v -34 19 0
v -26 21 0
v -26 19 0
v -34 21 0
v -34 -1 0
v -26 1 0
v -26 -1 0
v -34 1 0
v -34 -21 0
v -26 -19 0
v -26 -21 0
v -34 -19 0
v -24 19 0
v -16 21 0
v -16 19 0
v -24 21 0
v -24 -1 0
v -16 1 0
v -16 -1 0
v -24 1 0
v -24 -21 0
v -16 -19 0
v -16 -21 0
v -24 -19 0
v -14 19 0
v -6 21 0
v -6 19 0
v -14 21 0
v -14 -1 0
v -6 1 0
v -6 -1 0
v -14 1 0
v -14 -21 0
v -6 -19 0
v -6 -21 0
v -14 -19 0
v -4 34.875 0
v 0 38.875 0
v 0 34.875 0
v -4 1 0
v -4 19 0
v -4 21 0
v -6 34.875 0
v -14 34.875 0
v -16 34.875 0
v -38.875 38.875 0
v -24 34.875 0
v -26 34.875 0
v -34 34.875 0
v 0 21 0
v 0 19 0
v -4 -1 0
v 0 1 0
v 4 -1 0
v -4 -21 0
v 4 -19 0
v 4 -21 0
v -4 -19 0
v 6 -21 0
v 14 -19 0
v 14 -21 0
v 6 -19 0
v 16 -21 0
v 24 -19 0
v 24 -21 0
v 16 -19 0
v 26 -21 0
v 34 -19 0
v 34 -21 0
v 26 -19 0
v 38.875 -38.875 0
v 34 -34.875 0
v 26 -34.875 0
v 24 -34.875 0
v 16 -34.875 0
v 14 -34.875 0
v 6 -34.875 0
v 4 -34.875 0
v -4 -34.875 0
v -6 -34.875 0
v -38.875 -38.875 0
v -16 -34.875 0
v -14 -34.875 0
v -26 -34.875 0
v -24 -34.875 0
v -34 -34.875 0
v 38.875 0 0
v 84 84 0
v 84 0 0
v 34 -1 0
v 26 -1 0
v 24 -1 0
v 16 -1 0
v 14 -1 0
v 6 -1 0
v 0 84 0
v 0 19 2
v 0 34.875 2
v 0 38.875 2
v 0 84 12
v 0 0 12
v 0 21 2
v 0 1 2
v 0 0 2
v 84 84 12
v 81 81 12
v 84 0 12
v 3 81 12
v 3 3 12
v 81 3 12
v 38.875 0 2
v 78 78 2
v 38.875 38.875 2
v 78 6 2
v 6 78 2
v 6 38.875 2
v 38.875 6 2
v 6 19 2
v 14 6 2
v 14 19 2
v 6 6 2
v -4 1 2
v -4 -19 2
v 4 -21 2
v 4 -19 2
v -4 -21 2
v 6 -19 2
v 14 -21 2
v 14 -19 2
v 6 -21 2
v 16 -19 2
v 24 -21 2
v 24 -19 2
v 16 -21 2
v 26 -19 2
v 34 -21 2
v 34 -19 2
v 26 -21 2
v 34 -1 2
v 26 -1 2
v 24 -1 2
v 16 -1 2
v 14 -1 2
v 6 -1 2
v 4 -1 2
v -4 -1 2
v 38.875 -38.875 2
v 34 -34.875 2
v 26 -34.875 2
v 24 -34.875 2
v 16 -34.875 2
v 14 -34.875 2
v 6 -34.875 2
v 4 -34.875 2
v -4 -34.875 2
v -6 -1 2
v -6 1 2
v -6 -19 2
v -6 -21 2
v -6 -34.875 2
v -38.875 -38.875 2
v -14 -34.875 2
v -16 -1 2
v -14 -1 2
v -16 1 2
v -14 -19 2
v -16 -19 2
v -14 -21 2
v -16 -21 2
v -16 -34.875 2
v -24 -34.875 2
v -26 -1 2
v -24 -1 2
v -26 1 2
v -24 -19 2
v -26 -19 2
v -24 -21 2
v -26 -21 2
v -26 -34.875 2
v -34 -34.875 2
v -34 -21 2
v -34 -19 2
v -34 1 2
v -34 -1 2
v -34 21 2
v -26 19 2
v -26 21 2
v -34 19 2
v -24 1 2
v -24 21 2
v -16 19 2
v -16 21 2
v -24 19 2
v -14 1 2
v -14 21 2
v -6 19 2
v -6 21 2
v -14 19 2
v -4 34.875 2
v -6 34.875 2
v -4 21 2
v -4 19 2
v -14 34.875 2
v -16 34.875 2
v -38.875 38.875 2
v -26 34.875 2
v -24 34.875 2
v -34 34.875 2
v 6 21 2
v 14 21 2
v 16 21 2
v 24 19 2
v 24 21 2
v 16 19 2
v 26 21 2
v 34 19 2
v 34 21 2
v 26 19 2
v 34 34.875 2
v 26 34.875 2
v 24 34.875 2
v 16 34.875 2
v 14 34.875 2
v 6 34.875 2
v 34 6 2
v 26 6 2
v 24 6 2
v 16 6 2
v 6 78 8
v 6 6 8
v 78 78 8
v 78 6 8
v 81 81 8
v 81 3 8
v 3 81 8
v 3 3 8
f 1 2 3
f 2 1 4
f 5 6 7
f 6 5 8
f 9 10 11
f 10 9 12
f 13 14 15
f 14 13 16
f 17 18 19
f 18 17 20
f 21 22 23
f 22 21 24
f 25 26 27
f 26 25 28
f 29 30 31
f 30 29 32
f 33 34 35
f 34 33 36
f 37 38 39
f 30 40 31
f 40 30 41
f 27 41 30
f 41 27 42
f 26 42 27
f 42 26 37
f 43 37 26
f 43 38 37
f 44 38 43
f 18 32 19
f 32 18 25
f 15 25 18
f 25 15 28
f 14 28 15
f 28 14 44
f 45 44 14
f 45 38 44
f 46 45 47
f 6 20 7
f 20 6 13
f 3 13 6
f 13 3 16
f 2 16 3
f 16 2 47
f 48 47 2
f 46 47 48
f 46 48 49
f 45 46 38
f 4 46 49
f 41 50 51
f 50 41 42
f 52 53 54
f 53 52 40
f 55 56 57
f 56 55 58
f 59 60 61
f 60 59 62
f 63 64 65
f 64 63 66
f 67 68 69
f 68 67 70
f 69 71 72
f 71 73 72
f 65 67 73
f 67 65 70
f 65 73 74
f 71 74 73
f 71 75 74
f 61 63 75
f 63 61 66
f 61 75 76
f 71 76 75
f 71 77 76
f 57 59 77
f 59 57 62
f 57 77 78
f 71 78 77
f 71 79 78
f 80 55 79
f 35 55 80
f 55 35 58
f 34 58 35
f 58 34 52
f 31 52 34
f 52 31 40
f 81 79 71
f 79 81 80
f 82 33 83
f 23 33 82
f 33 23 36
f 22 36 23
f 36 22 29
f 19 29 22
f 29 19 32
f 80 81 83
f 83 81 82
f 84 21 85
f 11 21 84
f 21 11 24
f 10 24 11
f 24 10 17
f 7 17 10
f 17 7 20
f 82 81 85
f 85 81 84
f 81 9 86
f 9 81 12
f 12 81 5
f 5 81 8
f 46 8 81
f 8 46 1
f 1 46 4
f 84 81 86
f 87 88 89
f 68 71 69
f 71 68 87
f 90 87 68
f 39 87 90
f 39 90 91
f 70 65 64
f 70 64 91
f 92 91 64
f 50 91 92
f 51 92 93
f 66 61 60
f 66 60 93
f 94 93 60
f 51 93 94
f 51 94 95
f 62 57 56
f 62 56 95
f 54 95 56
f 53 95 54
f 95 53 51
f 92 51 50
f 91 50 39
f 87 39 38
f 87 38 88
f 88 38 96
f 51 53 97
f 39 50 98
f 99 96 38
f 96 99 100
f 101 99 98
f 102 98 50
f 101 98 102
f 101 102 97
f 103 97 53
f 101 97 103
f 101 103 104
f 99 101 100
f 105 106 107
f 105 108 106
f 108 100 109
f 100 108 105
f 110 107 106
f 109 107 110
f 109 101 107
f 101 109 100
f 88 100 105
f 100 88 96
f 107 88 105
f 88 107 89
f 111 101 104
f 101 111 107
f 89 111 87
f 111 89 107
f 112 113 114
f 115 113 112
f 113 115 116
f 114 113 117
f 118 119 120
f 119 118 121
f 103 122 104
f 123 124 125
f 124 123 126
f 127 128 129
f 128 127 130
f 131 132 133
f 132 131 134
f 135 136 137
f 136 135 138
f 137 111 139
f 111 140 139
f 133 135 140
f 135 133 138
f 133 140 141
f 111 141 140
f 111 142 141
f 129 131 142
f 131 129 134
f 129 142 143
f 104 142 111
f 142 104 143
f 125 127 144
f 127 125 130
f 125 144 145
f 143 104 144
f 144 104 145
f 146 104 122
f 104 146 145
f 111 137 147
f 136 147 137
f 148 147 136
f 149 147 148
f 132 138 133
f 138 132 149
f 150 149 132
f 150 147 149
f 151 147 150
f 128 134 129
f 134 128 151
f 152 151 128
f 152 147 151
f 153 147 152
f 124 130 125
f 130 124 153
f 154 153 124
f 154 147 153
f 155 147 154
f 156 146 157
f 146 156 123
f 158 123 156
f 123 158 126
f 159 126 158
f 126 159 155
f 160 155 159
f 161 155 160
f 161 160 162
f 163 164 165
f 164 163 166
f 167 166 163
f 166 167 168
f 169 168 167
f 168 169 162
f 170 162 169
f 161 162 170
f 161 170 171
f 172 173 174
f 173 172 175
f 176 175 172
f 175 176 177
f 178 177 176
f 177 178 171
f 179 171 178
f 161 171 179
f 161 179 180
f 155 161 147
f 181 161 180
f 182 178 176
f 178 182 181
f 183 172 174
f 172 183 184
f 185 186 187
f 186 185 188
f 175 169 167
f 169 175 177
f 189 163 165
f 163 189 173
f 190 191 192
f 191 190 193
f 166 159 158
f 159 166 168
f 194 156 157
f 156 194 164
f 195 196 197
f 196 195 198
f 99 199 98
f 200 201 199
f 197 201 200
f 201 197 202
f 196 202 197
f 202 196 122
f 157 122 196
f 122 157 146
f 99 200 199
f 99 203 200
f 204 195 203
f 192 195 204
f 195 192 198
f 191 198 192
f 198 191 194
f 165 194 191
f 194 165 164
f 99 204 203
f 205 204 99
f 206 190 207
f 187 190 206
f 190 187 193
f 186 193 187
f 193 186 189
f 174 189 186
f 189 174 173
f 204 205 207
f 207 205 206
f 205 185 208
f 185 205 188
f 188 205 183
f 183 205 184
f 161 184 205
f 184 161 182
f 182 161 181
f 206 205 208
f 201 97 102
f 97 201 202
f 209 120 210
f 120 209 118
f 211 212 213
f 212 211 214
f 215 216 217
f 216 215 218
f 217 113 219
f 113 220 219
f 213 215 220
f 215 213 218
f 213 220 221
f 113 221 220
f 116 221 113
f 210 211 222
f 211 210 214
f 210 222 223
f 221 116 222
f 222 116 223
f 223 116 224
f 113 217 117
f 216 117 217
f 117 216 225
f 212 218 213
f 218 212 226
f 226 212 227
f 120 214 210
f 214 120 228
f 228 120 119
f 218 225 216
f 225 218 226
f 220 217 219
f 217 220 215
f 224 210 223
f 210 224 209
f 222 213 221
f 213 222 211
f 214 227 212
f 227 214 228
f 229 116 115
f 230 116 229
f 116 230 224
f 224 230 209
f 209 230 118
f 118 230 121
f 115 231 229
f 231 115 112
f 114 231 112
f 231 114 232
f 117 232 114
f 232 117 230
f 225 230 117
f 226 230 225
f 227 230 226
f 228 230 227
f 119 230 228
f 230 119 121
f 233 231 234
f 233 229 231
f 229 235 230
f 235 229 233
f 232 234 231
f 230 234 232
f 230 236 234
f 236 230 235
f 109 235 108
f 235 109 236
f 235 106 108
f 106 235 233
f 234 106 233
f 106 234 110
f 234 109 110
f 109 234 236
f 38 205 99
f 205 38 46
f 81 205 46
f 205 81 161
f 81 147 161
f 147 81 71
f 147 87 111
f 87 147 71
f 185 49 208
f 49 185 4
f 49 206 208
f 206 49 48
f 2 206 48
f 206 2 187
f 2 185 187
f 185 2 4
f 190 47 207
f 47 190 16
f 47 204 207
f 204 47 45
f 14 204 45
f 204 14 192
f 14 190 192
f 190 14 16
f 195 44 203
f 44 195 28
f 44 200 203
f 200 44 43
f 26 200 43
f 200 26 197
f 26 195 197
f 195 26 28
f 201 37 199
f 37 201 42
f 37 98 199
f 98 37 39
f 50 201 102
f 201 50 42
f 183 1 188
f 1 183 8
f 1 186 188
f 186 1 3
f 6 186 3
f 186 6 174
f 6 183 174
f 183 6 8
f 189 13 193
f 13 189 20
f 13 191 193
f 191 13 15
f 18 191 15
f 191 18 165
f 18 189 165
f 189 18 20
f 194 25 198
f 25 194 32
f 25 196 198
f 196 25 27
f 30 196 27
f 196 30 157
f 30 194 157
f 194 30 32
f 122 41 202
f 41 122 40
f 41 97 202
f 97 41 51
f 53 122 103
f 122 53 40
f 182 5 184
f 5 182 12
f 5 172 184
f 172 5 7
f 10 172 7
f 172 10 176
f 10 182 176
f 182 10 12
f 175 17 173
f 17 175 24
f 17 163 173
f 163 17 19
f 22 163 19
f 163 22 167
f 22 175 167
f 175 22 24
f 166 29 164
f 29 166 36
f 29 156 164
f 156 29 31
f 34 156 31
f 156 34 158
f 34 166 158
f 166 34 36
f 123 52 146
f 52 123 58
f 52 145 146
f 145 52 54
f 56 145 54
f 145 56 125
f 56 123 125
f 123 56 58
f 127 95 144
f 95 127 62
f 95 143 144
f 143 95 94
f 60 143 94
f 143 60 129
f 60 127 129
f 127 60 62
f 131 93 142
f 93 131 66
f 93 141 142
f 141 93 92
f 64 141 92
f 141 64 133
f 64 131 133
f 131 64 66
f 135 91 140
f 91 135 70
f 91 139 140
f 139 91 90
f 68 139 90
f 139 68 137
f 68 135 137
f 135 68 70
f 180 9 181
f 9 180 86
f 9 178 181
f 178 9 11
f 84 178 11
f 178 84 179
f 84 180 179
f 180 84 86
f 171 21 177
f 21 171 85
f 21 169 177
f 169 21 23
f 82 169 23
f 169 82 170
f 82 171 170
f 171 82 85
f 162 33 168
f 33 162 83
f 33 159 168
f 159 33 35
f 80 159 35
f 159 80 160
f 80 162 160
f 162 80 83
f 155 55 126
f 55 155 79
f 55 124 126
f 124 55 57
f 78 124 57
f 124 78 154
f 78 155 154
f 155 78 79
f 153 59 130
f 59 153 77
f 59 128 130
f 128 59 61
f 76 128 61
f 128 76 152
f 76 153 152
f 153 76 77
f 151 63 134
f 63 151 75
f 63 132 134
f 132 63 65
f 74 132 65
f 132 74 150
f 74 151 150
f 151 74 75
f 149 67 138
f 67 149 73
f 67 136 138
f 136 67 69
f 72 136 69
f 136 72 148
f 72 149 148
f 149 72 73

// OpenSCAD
totalSide = 84;
plateDelta = 6;
plateSide = totalSide - plateDelta;
height = 12;

module plate3d(side) {
  linear_extrude(height=2) plate(side=side - 0.25);;
}

module plate(side) {
  difference() {
    color("blue") square(side, center=true);
    for (i = [-3:3]) {
      translate(v=[i * 10, 0, 0]) square([8, side - 8], center=true);
    }
  }
  for (i = [-1:1]) {
    translate(v=[0, i * 20, 0]) square([side - 8, 2], center=true);
  }
}

module base(side, plateSide, height) {
  baseSurfaceThickness = 2;
  visualAid = 1;
  plateDistanceFromBaseSurface = 8;
  difference() {
    color("orange") linear_extrude(height=height) square(side);
    color("pink") translate([plateDelta, plateDelta, baseSurfaceThickness])
        linear_extrude(height - baseSurfaceThickness + visualAid)
          square(plateSide - plateDelta);
    color("purple") translate([plateDelta / 2, plateDelta / 2, plateDistanceFromBaseSurface])
        linear_extrude(height=height - plateDistanceFromBaseSurface + visualAid) square(plateSide);
  }
}

plate3d(plateSide);
base(totalSide, plateSide, height);
